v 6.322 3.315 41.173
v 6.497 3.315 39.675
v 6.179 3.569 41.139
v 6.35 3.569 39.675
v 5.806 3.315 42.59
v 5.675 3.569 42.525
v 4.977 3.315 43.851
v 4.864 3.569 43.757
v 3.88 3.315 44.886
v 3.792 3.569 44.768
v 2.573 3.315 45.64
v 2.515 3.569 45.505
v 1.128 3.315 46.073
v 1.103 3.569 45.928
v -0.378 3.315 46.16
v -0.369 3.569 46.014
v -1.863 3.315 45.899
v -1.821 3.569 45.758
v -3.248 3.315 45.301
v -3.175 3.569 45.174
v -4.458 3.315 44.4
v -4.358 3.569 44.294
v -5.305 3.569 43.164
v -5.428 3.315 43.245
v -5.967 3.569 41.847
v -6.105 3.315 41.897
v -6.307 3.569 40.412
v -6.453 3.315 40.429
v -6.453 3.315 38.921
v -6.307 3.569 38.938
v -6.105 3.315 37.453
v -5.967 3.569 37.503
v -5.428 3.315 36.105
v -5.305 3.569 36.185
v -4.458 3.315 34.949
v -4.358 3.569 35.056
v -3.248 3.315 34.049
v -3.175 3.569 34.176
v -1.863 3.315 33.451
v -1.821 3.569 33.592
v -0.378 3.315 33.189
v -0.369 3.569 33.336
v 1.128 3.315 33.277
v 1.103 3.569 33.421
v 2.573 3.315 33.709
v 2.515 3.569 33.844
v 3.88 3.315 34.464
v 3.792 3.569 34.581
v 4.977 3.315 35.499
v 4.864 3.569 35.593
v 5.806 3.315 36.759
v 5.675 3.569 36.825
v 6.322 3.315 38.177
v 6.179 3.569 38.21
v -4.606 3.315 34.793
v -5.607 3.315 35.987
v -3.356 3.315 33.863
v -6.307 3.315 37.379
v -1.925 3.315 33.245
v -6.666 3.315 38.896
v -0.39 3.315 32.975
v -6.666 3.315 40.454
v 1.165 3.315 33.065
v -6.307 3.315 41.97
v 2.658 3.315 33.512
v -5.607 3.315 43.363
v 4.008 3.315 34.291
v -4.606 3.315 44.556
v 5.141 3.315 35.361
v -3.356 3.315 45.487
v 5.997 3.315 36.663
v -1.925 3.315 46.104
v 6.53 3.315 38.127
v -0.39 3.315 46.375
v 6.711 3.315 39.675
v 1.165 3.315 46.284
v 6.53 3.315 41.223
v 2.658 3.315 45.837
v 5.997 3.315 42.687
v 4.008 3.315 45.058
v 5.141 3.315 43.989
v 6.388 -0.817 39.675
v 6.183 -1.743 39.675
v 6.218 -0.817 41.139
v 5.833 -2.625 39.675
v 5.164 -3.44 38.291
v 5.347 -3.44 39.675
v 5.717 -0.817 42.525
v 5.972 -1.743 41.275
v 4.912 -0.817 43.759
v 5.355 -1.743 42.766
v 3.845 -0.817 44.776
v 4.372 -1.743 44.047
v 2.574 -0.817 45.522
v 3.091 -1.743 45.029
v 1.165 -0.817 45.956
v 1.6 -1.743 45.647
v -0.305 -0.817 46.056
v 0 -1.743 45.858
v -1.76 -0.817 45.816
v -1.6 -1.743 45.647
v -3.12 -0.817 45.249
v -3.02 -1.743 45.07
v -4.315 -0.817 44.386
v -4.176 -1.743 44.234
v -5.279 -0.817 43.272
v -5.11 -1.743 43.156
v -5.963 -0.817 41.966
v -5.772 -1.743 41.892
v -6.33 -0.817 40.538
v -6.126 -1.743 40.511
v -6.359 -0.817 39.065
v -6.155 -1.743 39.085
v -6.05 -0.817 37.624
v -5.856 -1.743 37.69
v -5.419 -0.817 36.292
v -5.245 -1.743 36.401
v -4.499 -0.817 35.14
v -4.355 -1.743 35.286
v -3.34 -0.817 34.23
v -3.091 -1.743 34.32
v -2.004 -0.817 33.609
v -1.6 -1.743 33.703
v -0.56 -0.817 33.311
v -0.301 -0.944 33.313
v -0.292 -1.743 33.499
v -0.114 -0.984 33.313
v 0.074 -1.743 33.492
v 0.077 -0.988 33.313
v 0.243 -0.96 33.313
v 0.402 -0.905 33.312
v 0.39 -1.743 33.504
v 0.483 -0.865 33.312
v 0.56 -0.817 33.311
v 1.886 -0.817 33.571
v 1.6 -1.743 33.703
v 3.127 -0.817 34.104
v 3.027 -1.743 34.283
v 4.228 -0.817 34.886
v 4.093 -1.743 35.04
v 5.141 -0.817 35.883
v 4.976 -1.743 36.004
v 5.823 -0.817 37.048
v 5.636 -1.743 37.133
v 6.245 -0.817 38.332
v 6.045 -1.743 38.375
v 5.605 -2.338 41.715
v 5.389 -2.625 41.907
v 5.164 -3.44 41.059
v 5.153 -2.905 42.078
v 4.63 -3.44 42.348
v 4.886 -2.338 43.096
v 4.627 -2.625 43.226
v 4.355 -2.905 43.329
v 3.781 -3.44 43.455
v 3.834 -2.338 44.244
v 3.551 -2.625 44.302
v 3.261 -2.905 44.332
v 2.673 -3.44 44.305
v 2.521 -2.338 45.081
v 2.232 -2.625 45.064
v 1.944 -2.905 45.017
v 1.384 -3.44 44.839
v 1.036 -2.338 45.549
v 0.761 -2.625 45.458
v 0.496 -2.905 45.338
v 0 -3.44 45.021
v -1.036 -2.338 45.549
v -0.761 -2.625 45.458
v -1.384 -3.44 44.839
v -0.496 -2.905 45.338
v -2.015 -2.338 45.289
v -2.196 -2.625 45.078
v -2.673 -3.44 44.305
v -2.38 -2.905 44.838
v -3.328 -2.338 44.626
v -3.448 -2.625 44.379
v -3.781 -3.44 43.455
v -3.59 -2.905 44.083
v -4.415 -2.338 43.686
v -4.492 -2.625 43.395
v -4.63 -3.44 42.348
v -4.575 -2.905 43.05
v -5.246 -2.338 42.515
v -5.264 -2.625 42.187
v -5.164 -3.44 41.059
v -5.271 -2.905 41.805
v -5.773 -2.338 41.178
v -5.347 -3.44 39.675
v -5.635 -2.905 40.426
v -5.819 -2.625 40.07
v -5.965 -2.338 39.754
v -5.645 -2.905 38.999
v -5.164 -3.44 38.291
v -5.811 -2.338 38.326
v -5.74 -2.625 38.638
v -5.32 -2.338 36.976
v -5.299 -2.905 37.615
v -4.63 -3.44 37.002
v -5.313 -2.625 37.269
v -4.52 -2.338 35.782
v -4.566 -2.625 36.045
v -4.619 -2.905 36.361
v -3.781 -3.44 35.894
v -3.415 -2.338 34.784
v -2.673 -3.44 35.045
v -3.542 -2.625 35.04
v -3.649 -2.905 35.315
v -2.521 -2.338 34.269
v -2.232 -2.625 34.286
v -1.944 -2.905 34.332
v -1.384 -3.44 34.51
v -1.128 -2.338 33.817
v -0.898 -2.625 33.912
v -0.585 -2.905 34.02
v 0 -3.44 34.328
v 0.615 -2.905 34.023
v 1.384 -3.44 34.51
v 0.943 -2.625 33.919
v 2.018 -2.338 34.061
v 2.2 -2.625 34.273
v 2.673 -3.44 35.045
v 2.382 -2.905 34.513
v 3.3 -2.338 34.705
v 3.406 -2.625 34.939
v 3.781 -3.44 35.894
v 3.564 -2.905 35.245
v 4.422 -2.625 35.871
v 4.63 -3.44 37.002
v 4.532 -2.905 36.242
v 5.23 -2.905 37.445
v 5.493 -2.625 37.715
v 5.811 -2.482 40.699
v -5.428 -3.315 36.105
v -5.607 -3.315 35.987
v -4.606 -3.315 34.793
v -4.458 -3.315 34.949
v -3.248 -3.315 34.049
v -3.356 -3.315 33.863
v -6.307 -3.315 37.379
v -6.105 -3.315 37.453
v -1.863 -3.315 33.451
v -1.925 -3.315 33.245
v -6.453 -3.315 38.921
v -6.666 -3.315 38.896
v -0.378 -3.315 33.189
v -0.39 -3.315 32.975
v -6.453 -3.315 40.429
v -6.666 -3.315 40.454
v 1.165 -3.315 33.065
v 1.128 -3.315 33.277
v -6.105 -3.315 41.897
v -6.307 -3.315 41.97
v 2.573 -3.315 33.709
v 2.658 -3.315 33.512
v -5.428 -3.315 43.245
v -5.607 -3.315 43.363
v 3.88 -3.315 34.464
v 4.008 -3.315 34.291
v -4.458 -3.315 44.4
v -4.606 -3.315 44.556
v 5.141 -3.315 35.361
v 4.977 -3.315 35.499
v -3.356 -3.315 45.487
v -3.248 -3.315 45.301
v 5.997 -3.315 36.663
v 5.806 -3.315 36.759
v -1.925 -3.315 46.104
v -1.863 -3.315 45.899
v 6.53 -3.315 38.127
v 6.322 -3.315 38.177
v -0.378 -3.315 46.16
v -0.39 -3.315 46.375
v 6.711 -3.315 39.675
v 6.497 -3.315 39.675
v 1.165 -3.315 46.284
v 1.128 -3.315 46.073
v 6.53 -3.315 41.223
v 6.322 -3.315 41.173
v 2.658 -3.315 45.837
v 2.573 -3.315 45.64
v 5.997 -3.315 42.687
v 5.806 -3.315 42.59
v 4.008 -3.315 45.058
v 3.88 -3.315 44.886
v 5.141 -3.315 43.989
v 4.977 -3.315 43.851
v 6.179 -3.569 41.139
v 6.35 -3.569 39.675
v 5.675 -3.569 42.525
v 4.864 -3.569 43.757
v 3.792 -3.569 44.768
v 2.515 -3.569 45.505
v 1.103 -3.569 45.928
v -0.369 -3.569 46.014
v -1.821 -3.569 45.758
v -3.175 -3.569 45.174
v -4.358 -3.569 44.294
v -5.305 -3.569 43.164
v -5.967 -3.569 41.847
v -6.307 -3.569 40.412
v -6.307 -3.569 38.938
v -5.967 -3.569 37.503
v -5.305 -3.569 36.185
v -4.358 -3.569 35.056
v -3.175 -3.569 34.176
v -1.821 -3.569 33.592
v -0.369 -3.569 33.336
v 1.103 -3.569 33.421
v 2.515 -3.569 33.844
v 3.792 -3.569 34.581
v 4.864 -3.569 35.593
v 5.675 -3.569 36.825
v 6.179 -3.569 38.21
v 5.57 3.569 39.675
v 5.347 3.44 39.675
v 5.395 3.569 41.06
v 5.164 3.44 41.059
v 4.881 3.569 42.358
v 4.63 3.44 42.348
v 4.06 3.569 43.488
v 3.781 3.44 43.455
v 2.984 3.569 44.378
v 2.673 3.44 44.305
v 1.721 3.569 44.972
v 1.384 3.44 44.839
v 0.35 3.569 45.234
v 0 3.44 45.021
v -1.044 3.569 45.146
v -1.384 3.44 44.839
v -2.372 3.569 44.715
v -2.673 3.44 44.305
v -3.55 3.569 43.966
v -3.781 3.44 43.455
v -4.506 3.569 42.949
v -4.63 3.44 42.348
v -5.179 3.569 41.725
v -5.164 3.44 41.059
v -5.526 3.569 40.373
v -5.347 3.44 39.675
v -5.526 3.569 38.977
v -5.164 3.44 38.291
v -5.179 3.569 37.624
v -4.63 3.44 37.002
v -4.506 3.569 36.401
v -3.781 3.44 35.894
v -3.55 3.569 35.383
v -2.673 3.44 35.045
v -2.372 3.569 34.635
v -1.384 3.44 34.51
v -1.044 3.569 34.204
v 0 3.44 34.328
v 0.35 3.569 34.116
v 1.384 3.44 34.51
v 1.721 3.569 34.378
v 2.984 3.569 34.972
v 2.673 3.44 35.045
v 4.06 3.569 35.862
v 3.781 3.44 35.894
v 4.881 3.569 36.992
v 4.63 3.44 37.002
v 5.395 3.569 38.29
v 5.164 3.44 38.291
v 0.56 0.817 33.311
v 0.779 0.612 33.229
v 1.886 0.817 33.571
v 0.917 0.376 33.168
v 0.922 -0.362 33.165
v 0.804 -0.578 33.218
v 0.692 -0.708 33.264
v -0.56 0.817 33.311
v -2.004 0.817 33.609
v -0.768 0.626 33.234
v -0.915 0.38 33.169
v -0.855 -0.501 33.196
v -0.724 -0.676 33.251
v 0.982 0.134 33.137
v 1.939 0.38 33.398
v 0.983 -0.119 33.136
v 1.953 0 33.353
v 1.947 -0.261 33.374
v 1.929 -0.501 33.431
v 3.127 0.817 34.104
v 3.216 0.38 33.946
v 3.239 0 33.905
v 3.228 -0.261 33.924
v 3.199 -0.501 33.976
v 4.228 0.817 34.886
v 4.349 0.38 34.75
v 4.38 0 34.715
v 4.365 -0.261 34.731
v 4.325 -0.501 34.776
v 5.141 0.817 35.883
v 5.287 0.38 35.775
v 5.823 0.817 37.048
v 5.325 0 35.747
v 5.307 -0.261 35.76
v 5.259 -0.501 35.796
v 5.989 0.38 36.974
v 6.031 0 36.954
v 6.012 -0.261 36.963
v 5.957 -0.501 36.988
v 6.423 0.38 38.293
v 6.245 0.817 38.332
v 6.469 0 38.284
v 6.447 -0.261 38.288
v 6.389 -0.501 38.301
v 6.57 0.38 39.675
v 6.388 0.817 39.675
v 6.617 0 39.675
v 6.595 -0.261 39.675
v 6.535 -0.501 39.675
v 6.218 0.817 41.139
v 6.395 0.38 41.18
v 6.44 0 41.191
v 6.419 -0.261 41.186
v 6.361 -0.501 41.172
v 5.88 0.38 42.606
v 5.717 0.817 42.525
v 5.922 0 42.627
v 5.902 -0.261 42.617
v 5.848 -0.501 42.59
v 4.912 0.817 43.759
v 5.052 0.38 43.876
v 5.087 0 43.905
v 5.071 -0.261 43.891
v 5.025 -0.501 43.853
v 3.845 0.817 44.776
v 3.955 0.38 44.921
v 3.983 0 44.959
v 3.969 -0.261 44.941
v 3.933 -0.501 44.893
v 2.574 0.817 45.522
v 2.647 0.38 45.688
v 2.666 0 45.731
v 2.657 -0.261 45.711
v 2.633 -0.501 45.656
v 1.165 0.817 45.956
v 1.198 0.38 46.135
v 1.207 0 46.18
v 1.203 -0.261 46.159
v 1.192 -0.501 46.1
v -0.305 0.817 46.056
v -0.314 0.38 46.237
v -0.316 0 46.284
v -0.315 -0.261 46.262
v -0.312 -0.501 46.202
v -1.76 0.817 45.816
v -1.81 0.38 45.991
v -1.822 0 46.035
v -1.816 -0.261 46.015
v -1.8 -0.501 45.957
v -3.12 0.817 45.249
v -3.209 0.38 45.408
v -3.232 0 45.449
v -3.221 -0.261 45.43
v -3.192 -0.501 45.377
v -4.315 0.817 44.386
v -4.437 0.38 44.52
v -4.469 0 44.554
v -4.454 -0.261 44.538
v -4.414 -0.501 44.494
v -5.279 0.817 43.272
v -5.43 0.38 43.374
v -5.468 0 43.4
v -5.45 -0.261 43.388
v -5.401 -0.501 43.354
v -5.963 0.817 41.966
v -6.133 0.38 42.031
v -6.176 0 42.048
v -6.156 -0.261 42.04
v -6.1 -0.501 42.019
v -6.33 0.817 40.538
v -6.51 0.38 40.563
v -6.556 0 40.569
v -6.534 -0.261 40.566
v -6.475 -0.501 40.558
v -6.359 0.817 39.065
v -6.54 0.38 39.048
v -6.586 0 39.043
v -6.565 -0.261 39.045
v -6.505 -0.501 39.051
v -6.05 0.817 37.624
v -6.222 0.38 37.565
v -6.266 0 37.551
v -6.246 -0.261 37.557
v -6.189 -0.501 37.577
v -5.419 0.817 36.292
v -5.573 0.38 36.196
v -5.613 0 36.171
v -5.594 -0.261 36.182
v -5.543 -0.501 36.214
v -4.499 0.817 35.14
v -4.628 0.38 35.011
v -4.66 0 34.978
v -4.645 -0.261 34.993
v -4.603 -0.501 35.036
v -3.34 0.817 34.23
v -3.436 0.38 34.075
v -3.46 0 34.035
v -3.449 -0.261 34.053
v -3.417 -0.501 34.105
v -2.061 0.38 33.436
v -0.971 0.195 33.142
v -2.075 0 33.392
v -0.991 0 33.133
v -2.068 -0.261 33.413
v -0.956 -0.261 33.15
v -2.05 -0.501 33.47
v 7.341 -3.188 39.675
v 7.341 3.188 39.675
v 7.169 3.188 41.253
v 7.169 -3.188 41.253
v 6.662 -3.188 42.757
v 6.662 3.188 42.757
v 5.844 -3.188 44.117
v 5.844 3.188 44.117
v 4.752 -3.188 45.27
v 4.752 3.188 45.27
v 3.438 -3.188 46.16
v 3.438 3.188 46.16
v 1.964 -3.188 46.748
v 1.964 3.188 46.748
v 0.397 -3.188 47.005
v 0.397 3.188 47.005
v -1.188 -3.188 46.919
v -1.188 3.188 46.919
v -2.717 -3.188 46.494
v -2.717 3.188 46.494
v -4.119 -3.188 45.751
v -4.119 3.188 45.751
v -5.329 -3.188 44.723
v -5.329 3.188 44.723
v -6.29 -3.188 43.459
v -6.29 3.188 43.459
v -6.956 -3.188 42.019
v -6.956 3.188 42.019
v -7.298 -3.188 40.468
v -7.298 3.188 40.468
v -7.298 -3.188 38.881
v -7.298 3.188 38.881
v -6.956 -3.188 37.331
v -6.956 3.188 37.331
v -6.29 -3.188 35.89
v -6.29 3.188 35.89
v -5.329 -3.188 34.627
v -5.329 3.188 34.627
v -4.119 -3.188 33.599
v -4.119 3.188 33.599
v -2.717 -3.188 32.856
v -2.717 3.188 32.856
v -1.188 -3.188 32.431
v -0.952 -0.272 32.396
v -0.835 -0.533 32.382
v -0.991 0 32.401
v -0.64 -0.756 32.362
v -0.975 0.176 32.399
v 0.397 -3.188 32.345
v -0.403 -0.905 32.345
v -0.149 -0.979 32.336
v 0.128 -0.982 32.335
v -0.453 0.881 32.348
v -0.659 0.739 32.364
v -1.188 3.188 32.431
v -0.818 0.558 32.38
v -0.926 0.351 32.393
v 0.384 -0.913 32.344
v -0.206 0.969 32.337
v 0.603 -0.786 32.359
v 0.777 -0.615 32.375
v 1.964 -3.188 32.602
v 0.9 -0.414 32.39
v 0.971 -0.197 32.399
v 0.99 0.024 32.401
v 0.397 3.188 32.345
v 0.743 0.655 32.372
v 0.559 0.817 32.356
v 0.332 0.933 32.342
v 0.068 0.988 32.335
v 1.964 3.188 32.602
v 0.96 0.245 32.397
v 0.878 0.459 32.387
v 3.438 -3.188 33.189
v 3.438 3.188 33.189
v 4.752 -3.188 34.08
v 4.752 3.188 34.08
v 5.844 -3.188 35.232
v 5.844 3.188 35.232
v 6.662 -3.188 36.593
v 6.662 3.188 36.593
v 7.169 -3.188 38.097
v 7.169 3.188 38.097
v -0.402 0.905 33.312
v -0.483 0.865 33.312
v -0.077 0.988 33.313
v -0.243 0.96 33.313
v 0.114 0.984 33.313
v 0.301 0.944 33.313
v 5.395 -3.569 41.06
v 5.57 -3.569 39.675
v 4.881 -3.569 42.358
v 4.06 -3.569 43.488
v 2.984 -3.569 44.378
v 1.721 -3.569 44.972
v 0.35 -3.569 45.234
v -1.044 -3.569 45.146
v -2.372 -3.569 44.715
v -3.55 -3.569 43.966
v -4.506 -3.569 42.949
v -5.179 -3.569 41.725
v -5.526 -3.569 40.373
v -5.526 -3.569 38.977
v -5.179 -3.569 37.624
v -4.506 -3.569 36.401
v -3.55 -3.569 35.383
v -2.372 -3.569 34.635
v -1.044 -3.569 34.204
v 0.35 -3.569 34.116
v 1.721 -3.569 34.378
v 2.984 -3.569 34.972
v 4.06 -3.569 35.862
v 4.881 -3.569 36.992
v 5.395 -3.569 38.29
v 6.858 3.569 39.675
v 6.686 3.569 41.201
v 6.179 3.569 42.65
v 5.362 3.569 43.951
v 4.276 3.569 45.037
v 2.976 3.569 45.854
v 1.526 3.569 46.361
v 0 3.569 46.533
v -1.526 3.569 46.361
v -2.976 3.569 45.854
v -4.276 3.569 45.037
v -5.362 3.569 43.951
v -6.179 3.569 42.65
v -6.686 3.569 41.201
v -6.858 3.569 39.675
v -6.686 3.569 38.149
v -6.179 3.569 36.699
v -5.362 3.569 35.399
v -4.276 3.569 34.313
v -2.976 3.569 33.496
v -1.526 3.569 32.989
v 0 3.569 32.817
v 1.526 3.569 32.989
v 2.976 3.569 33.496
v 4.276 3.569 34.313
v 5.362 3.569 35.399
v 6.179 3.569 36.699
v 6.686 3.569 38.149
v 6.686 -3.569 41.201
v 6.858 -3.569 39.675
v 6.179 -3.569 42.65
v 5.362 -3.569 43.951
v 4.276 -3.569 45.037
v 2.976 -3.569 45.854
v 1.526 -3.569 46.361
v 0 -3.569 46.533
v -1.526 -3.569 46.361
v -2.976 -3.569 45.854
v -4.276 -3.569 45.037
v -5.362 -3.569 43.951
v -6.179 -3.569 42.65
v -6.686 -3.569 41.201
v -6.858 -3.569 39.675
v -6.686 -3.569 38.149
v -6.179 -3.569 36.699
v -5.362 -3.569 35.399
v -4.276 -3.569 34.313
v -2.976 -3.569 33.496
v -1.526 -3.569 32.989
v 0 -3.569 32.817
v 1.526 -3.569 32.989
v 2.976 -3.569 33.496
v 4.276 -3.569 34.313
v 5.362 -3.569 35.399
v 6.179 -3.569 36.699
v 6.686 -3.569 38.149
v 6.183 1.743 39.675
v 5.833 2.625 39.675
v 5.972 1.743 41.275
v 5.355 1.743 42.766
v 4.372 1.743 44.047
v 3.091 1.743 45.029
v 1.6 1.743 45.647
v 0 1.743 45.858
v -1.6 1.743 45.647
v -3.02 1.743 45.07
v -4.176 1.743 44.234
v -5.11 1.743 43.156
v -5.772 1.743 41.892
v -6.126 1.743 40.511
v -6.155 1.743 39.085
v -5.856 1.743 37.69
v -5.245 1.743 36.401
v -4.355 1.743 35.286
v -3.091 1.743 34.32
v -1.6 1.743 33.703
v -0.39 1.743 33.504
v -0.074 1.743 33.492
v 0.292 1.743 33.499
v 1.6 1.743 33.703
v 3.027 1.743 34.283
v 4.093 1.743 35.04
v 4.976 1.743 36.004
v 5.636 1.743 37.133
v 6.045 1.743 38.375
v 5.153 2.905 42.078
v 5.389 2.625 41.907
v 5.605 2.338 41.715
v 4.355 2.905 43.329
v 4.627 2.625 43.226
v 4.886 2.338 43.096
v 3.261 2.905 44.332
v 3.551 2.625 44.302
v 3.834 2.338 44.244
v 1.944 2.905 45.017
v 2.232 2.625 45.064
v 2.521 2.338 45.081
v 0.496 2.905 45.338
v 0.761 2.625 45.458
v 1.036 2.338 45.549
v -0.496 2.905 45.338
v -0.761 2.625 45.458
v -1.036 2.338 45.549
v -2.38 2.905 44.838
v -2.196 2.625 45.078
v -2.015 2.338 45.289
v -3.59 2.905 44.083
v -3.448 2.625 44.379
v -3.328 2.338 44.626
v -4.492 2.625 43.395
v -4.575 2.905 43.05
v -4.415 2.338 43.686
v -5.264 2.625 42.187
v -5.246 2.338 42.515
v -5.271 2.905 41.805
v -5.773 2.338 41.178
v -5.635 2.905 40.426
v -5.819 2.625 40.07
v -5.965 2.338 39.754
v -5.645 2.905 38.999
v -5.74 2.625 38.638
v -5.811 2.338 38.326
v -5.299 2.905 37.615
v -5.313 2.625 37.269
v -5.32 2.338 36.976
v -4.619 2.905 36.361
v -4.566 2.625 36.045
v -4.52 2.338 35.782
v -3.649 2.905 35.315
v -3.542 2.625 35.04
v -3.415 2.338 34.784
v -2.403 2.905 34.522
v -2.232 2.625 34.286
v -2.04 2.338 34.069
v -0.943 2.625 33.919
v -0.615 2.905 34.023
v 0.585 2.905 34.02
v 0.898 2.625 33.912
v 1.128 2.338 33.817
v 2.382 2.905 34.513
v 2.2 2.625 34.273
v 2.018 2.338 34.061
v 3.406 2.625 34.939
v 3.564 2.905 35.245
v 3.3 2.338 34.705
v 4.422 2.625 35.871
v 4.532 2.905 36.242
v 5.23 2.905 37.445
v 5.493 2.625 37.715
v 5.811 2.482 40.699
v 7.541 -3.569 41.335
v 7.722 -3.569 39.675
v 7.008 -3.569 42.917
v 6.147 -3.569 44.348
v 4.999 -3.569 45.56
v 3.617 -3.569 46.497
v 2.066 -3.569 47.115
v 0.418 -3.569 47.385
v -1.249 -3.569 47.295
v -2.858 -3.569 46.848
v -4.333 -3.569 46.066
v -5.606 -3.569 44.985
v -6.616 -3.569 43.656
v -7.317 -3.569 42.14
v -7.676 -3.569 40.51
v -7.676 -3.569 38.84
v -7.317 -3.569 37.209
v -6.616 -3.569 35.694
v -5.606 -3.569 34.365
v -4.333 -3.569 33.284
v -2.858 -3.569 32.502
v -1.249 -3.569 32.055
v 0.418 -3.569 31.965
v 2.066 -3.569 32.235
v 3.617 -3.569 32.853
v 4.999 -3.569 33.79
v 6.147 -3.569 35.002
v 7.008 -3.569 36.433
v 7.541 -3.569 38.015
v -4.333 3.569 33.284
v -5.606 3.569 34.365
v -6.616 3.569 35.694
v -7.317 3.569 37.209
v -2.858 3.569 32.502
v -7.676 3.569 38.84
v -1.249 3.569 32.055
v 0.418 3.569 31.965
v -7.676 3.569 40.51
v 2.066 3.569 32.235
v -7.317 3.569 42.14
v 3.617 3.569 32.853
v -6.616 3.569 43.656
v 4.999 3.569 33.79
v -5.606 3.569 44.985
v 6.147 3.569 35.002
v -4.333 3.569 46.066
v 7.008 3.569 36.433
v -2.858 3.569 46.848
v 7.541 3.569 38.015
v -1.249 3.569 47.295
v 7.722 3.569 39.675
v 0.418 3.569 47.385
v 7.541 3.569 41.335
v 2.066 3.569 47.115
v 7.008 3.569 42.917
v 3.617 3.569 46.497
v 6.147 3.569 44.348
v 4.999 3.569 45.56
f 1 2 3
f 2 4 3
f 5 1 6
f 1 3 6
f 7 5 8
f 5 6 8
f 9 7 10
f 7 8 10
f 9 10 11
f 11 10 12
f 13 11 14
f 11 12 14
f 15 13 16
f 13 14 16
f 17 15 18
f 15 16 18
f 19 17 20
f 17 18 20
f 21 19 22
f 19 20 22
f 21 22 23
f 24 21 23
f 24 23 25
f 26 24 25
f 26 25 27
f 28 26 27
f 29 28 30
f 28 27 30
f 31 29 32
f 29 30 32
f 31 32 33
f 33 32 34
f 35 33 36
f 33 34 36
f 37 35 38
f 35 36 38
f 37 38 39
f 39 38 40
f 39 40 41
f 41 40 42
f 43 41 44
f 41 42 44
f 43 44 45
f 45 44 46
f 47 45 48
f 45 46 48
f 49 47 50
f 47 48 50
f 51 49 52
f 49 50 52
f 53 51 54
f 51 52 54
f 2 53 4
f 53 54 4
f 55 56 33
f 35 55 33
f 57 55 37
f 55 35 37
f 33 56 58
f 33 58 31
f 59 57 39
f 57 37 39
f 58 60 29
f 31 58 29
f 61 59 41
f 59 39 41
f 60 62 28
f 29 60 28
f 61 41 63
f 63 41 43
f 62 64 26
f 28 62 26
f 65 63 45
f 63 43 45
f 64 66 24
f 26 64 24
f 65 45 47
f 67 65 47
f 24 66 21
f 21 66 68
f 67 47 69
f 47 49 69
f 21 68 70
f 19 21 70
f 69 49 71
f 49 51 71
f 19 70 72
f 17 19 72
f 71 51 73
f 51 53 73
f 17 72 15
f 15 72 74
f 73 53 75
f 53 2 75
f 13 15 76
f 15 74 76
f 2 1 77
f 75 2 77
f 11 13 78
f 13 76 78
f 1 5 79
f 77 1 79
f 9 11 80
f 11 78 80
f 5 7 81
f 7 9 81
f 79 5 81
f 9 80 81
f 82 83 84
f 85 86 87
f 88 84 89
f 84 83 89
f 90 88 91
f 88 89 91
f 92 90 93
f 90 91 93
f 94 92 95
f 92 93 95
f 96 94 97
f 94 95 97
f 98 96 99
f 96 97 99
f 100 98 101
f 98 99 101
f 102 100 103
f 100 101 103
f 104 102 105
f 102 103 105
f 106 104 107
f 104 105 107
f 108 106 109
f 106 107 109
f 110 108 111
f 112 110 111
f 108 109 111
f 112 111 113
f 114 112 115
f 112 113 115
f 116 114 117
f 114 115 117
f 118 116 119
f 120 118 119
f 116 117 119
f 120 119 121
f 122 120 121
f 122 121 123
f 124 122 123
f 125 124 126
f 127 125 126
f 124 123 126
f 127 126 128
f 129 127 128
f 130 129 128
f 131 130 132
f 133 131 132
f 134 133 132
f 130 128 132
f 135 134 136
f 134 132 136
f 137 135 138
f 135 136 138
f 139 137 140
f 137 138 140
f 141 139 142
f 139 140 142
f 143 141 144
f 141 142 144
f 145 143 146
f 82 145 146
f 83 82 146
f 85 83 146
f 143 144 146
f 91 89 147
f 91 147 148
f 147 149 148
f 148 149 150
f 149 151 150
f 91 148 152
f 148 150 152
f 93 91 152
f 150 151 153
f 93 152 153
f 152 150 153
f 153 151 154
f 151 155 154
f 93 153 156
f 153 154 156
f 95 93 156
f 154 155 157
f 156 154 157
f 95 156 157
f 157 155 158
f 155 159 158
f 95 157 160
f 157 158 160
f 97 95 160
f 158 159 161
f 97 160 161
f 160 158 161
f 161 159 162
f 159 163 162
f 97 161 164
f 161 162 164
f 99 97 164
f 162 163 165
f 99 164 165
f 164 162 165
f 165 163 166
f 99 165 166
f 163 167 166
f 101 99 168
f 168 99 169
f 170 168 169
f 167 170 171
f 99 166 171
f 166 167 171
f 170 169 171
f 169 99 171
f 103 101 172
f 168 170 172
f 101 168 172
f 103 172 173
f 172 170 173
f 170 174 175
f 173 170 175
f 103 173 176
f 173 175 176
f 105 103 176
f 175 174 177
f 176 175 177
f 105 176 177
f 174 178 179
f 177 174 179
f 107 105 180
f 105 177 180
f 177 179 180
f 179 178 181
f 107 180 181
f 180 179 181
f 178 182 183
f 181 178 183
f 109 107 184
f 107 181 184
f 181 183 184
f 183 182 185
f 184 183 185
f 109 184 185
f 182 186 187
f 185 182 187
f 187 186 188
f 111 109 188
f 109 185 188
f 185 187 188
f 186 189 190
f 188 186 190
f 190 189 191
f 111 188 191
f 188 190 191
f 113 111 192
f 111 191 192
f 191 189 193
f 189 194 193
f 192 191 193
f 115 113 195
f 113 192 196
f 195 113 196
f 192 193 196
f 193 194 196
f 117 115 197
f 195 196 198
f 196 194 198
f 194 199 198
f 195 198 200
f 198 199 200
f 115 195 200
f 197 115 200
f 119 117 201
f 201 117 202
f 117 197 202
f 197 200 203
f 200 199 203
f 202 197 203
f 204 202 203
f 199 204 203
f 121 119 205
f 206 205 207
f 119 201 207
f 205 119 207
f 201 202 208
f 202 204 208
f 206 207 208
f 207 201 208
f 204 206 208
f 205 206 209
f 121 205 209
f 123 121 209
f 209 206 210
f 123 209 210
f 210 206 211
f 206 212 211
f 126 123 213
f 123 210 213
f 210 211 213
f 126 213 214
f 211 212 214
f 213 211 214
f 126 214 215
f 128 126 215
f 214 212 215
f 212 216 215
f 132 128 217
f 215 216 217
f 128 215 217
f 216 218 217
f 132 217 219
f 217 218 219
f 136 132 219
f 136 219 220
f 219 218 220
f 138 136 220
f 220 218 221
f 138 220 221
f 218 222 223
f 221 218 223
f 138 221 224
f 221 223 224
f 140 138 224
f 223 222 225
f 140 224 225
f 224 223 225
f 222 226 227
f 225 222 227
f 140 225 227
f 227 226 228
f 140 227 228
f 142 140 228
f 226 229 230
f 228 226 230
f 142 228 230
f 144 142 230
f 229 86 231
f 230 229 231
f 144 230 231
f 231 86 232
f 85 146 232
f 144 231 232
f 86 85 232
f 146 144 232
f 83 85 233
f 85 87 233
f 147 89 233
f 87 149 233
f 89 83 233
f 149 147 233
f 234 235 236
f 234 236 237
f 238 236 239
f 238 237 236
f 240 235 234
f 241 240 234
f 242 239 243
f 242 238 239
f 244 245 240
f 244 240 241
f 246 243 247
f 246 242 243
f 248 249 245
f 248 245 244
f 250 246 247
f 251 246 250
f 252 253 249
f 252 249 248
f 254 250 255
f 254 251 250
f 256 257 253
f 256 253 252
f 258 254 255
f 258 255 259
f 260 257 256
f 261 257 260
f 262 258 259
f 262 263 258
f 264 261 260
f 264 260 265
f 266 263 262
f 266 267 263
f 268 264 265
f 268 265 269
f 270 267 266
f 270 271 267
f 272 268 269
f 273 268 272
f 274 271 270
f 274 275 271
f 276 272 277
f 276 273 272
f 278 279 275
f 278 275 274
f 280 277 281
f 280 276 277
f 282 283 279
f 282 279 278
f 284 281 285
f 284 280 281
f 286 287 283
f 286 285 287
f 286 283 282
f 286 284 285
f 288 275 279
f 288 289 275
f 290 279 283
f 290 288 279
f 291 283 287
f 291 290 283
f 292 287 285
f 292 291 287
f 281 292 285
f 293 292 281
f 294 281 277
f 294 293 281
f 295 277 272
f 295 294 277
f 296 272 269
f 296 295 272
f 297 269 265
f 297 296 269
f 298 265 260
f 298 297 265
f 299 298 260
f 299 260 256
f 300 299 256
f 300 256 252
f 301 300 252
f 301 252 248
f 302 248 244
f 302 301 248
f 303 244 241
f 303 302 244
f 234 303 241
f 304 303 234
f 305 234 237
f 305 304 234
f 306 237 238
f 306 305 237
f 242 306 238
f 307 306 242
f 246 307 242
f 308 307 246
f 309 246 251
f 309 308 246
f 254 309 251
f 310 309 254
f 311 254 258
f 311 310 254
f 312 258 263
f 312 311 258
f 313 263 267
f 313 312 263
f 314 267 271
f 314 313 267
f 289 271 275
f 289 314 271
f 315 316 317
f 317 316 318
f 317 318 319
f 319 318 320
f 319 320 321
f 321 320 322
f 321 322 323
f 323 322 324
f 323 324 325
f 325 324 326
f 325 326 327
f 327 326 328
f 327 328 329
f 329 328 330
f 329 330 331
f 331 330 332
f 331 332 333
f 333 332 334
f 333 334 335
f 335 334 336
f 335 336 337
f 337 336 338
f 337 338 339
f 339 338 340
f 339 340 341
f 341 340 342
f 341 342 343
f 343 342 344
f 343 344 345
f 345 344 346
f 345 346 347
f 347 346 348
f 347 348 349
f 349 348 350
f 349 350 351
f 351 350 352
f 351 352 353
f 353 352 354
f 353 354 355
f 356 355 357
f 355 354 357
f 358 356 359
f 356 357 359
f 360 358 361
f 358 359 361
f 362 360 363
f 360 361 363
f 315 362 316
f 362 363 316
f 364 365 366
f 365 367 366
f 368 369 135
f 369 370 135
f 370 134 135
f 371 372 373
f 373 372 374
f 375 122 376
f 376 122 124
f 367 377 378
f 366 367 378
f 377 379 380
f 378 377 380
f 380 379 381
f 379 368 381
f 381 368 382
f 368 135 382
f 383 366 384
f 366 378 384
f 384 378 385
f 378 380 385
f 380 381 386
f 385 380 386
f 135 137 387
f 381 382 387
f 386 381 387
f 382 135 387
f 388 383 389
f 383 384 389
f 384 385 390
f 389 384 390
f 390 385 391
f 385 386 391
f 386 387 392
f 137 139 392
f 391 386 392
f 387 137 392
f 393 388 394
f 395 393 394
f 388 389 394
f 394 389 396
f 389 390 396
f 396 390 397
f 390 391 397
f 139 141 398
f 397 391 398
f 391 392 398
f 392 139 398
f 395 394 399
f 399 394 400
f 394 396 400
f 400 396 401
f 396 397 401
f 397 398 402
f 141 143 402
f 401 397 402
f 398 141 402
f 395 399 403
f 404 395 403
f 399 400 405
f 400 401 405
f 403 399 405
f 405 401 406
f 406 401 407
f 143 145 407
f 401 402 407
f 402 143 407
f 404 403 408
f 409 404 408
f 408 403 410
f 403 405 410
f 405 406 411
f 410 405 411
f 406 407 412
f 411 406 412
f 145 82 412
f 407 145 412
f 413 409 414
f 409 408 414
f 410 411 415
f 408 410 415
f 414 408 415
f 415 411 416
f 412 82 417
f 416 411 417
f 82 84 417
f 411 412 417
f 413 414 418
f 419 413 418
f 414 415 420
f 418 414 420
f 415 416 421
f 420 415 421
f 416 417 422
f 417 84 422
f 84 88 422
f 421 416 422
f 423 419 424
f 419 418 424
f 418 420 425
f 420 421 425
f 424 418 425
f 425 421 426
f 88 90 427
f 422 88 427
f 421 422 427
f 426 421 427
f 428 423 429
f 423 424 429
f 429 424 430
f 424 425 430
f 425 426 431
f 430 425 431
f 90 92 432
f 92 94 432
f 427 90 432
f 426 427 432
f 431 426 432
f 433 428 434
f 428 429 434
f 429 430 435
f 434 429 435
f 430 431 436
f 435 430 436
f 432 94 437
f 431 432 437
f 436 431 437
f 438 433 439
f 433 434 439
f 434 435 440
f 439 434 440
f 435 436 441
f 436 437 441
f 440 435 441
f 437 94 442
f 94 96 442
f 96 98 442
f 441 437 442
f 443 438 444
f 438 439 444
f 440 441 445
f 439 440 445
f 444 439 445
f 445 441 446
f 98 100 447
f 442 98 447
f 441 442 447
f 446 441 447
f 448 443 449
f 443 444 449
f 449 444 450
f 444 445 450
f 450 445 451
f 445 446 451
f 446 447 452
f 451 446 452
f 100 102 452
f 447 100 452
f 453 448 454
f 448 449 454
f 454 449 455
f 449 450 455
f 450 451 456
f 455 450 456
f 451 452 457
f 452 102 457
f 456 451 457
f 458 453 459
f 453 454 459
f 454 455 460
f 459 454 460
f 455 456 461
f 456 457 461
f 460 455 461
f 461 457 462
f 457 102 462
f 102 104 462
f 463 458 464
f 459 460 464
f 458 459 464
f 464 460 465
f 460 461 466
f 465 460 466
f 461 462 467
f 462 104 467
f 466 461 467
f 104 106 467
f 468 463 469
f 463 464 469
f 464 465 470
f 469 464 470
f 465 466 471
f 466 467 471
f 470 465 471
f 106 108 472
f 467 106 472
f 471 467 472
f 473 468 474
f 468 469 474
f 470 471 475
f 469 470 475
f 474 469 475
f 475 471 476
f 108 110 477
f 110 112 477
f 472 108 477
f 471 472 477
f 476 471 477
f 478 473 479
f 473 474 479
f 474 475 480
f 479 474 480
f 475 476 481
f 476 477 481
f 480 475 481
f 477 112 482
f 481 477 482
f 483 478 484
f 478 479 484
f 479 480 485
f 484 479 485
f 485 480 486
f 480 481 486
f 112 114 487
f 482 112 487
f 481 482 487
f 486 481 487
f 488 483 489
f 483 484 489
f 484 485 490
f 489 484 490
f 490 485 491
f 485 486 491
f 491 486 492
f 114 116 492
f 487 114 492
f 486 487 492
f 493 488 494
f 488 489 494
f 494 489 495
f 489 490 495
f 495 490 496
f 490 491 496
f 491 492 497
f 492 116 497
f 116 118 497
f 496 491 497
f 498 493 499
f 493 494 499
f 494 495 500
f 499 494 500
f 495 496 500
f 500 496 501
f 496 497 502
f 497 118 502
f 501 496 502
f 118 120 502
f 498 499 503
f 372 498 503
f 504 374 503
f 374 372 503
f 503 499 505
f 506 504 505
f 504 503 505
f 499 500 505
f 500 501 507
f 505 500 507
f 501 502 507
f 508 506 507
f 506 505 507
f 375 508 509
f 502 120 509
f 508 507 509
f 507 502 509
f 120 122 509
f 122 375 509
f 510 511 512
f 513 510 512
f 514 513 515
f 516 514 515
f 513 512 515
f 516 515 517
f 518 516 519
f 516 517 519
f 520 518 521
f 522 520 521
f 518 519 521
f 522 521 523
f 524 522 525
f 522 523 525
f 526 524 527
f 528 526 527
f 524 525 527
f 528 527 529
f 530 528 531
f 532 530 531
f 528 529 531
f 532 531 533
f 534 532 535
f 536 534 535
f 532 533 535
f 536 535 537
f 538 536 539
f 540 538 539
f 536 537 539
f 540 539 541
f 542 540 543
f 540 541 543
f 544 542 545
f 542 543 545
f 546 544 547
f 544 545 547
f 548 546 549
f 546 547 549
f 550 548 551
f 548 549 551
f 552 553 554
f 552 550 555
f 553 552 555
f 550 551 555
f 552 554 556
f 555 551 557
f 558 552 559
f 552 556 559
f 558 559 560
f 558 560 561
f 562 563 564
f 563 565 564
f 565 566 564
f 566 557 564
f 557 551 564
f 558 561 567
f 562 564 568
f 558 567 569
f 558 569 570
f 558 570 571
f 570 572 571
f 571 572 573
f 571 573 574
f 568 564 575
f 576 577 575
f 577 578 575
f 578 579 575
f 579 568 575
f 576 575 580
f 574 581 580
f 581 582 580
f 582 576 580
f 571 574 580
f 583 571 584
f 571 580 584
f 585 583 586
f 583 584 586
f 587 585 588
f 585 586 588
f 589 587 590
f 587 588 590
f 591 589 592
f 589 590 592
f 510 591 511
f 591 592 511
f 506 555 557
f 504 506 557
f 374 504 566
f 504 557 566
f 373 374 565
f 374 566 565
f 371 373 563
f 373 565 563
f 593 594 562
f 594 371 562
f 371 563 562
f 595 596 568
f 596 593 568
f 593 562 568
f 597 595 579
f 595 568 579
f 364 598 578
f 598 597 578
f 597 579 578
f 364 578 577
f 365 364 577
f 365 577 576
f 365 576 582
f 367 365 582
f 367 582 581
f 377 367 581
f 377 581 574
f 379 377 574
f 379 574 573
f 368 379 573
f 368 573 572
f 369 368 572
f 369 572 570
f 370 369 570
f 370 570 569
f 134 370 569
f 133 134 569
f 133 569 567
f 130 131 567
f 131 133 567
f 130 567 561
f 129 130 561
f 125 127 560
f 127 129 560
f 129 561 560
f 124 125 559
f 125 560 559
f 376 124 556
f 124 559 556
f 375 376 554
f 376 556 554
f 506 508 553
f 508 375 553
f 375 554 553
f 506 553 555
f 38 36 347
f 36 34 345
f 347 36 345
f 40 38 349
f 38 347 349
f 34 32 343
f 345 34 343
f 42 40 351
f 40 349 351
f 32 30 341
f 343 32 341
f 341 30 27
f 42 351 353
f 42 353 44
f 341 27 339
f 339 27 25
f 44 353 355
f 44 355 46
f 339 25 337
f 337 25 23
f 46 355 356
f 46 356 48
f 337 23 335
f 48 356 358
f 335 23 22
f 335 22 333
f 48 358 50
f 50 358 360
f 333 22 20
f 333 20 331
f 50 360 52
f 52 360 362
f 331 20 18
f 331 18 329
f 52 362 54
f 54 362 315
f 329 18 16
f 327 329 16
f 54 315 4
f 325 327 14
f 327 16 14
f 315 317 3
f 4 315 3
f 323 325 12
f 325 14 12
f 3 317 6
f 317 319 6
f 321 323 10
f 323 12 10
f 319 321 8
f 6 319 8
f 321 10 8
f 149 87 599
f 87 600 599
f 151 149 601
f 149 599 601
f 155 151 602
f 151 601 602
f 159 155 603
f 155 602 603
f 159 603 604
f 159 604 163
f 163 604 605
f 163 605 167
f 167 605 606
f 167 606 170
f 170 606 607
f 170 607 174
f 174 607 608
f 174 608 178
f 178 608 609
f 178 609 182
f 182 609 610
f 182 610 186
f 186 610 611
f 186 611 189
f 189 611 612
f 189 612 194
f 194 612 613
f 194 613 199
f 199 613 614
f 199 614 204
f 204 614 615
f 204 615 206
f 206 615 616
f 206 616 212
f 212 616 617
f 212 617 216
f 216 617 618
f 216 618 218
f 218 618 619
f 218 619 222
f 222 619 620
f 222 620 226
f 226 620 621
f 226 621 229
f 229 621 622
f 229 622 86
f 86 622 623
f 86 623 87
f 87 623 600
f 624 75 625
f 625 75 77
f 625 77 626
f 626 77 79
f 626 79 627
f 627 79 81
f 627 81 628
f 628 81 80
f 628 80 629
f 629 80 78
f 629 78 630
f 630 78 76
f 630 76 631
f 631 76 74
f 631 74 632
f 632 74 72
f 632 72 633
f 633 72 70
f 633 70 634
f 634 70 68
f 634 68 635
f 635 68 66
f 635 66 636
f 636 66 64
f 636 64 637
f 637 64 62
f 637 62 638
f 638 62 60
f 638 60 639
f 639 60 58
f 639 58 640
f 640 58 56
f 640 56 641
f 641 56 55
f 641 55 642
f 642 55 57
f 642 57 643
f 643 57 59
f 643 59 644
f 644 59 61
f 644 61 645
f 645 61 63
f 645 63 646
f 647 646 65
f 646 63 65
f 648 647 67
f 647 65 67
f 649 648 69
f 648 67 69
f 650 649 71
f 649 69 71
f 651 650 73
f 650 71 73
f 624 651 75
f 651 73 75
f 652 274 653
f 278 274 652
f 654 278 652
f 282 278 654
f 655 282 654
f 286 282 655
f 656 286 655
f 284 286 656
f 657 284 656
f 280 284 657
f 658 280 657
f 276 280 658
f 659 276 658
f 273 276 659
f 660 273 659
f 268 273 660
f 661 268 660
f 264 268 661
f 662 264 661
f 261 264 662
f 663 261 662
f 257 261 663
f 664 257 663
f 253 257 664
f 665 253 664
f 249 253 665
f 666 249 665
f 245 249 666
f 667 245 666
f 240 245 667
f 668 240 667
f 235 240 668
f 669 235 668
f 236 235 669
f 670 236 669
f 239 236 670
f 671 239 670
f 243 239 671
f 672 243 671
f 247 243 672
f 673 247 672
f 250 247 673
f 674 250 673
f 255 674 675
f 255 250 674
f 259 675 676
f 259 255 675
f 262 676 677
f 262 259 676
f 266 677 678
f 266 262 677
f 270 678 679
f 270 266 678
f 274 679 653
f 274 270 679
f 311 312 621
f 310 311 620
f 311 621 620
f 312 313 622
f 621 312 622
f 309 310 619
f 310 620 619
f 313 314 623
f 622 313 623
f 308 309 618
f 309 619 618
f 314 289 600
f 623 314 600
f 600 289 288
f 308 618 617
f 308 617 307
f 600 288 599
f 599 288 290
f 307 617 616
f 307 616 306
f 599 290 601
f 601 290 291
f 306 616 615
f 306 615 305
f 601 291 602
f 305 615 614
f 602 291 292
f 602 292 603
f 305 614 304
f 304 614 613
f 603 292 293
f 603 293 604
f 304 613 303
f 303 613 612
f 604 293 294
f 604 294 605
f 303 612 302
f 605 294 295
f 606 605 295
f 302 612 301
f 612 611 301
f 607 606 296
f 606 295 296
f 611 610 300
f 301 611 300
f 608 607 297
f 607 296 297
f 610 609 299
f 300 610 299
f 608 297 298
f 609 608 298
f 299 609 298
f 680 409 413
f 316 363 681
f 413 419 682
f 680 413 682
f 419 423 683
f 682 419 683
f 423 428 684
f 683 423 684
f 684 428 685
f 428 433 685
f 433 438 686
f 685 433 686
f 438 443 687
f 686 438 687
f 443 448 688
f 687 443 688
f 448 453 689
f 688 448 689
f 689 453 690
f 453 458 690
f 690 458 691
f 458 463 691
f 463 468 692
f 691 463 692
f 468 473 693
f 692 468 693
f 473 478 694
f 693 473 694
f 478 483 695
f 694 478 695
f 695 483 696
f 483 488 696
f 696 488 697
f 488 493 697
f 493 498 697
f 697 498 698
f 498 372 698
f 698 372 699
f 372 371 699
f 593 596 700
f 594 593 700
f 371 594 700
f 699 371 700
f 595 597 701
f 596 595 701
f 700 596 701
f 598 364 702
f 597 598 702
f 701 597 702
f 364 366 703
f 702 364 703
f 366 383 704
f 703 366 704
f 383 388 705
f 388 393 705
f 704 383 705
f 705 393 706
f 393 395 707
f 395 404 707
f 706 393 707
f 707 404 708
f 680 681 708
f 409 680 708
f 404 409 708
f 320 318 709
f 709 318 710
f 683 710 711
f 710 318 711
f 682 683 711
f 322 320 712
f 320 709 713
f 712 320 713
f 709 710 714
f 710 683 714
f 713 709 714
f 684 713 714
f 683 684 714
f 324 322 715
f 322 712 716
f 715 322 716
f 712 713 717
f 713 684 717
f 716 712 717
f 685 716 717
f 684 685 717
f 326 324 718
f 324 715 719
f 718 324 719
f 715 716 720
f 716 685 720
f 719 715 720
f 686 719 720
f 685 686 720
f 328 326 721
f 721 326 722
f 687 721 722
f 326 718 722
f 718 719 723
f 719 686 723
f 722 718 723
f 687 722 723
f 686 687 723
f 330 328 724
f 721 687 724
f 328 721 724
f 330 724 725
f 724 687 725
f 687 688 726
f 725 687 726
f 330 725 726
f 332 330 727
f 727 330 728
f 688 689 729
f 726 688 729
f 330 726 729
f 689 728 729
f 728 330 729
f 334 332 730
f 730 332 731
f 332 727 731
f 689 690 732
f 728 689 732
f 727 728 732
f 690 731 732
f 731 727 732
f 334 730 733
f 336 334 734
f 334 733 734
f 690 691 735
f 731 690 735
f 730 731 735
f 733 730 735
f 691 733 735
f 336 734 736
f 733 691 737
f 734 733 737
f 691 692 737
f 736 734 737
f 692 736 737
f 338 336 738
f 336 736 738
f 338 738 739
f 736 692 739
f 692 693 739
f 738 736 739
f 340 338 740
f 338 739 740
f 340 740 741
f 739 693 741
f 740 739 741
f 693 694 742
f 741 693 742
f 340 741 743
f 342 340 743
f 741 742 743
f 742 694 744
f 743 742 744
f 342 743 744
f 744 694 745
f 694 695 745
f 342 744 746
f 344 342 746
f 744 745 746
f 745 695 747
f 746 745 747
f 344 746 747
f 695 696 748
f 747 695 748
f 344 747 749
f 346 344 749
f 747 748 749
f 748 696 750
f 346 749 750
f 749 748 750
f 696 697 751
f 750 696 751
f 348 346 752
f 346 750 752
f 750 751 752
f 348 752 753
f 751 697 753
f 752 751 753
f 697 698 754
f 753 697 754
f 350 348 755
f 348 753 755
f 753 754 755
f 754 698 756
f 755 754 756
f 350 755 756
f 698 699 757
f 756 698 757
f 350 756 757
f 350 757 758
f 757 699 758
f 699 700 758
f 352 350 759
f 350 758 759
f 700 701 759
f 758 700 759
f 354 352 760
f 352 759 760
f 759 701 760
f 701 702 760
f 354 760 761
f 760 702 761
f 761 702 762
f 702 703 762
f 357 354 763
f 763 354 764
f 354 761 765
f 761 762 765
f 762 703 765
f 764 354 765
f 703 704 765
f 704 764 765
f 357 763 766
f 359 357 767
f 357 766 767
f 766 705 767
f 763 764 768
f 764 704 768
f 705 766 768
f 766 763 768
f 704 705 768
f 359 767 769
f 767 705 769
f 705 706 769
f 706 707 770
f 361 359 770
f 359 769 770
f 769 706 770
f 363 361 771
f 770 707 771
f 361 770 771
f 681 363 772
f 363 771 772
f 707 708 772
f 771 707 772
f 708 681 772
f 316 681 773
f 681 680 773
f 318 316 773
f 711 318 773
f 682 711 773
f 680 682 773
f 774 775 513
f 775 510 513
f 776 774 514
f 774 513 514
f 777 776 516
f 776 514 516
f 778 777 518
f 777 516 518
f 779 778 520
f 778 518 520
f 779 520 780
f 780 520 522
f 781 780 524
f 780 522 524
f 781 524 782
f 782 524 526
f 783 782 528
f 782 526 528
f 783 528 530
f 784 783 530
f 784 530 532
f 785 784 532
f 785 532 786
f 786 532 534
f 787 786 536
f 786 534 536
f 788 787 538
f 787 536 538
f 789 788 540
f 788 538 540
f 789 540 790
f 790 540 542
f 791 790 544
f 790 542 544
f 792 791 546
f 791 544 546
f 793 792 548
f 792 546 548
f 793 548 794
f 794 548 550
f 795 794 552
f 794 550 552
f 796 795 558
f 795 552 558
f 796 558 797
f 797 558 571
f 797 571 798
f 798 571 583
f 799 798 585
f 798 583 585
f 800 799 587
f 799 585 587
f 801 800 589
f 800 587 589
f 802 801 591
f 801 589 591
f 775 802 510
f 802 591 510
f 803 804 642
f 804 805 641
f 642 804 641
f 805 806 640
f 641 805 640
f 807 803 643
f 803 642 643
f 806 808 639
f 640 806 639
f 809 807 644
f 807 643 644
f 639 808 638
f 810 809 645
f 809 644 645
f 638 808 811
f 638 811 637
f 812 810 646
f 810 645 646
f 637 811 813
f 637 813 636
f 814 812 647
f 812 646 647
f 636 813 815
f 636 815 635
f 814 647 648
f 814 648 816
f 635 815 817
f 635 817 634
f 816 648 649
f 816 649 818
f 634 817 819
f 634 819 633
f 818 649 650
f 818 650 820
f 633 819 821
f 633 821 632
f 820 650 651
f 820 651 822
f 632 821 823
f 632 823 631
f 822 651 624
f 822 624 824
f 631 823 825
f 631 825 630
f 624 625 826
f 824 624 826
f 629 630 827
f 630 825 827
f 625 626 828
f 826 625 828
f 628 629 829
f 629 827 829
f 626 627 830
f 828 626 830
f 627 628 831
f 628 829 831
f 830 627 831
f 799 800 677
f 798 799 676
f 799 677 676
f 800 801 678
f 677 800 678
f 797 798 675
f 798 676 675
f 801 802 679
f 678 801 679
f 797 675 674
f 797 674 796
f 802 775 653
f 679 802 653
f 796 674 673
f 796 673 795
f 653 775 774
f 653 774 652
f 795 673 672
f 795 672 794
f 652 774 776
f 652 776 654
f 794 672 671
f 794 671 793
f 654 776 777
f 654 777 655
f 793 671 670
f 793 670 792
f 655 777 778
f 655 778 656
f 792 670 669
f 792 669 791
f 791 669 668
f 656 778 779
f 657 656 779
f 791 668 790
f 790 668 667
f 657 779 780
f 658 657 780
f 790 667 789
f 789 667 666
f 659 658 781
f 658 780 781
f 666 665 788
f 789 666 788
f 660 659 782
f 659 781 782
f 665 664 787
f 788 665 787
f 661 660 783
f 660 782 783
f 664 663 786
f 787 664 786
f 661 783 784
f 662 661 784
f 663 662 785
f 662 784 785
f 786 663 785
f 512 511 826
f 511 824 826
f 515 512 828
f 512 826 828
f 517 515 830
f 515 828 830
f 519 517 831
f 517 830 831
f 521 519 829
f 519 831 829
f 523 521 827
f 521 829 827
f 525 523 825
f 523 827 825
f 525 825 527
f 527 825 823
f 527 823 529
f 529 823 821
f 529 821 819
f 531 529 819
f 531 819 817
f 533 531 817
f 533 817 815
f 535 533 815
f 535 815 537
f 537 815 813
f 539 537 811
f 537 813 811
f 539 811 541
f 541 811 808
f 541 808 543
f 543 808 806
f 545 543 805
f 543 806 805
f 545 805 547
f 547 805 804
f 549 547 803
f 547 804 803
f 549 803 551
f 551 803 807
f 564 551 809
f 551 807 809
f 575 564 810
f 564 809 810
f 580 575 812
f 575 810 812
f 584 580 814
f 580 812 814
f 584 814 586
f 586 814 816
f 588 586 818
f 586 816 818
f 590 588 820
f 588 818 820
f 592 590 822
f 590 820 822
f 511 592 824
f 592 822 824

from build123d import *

# Parameters (mm, degrees)
M1_6_CLEARANCE_HOLE1_REACH  = 19.298
M1_6_CLEARANCE_HOLE1_BORE_R = 0.9906


with BuildPart() as part:
    # Sketch1 → Revolve1 (revolve)
    with BuildSketch(Plane.XY.offset(39.6748)):
        with BuildLine():
            Line((5.346583358, -3.439813446), (5.569821421, -3.568700002))
            Line((5.569821421, -3.568700002), (7.7216, -3.568700002))
            Line((7.7216, -3.568700002), (7.3406, -3.187700002))
            Line((7.3406, -3.187700002), (7.3406, 3.187699998))
            Line((7.3406, 3.187699998), (7.7216, 3.568699998))
            Line((7.7216, 3.568699998), (5.569821421, 3.568699998))
            Line((5.569821421, 3.568699998), (5.346583358, 3.439813442))
            ThreePointArc((5.346583358, 3.439813442), (6.025505417, 2.191195883), (6.38819802, 0.816992461))
            add(Edge.make_bspline(
                [(6.38819802, 0.816992461), (6.479638913, 0.666309683), (6.54632523, 0.497761492), (6.582734648, 0.325305438), (6.619144066, 0.152849383), (6.626280801, -0.028271086), (6.603553858, -0.203057306), (6.580826914, -0.377843525), (6.527609455, -0.551116314), (6.448308441, -0.708526878), (6.429710698, -0.74544294), (6.409642818, -0.781654204), (6.388198021, -0.81699246)],
                knots=[0, 0, 0, 0, 0.000528773, 0.000528773, 0.000528773, 0.001057546, 0.001057546, 0.001057546, 0.001586318, 0.001586318, 0.001586318, 0.001708661, 0.001708661, 0.001708661, 0.001708661], degree=3))
            ThreePointArc((6.388198021, -0.81699246), (6.025505418, -2.191195885), (5.346583358, -3.439813446))
        make_face()
    revolve(axis=Axis((0, 3.5687, 39.6748), (0, -1, 0)))

    # M1.6 Clearance Hole1 bore (on position points) → M1.6 Clearance Hole1 (cut, up to next)
    with BuildSketch(Plane(origin=(0, 0, 32.3342), x_dir=(-1, 0, 0), z_dir=(0, 0, -1)), mode=Mode.PRIVATE) as m1_6_clearance_hole1_sk1:
        Circle(M1_6_CLEARANCE_HOLE1_BORE_R)
    m1_6_clearance_hole1_tool1 = extrude(m1_6_clearance_hole1_sk1.sketch, amount=-M1_6_CLEARANCE_HOLE1_REACH, mode=Mode.PRIVATE) & part.part
    add(m1_6_clearance_hole1_tool1.solids().sort_by_distance((0, 0, 32.3342))[0], mode=Mode.SUBTRACT)

    # Sketch3 → Cut-Revolve1 (revolve, cut)
    with BuildSketch(Plane(origin=(0, 0, 0), x_dir=(0, 0, -1), z_dir=(1, 0, 0)), mode=Mode.PRIVATE) as cut_revolve1_sk:
        Polygon((-46.5328, 3.568699998), (-46.386153032, 3.314699998), (-46.171446968, 3.314699998), (-46.0248, 3.568699998), align=None)
    cut_revolve1 = revolve(cut_revolve1_sk.sketch.rotate(Axis((0, 3.568699998, 39.6748), (0, -1, 0)), 270), axis=Axis((0, 3.568699998, 39.6748), (0, -1, 0)), mode=Mode.SUBTRACT)

    # Mirror1: Cut-Revolve1 across plane
    add(cut_revolve1.mirror(Plane.ZX), mode=Mode.SUBTRACT)


solid = part.part
